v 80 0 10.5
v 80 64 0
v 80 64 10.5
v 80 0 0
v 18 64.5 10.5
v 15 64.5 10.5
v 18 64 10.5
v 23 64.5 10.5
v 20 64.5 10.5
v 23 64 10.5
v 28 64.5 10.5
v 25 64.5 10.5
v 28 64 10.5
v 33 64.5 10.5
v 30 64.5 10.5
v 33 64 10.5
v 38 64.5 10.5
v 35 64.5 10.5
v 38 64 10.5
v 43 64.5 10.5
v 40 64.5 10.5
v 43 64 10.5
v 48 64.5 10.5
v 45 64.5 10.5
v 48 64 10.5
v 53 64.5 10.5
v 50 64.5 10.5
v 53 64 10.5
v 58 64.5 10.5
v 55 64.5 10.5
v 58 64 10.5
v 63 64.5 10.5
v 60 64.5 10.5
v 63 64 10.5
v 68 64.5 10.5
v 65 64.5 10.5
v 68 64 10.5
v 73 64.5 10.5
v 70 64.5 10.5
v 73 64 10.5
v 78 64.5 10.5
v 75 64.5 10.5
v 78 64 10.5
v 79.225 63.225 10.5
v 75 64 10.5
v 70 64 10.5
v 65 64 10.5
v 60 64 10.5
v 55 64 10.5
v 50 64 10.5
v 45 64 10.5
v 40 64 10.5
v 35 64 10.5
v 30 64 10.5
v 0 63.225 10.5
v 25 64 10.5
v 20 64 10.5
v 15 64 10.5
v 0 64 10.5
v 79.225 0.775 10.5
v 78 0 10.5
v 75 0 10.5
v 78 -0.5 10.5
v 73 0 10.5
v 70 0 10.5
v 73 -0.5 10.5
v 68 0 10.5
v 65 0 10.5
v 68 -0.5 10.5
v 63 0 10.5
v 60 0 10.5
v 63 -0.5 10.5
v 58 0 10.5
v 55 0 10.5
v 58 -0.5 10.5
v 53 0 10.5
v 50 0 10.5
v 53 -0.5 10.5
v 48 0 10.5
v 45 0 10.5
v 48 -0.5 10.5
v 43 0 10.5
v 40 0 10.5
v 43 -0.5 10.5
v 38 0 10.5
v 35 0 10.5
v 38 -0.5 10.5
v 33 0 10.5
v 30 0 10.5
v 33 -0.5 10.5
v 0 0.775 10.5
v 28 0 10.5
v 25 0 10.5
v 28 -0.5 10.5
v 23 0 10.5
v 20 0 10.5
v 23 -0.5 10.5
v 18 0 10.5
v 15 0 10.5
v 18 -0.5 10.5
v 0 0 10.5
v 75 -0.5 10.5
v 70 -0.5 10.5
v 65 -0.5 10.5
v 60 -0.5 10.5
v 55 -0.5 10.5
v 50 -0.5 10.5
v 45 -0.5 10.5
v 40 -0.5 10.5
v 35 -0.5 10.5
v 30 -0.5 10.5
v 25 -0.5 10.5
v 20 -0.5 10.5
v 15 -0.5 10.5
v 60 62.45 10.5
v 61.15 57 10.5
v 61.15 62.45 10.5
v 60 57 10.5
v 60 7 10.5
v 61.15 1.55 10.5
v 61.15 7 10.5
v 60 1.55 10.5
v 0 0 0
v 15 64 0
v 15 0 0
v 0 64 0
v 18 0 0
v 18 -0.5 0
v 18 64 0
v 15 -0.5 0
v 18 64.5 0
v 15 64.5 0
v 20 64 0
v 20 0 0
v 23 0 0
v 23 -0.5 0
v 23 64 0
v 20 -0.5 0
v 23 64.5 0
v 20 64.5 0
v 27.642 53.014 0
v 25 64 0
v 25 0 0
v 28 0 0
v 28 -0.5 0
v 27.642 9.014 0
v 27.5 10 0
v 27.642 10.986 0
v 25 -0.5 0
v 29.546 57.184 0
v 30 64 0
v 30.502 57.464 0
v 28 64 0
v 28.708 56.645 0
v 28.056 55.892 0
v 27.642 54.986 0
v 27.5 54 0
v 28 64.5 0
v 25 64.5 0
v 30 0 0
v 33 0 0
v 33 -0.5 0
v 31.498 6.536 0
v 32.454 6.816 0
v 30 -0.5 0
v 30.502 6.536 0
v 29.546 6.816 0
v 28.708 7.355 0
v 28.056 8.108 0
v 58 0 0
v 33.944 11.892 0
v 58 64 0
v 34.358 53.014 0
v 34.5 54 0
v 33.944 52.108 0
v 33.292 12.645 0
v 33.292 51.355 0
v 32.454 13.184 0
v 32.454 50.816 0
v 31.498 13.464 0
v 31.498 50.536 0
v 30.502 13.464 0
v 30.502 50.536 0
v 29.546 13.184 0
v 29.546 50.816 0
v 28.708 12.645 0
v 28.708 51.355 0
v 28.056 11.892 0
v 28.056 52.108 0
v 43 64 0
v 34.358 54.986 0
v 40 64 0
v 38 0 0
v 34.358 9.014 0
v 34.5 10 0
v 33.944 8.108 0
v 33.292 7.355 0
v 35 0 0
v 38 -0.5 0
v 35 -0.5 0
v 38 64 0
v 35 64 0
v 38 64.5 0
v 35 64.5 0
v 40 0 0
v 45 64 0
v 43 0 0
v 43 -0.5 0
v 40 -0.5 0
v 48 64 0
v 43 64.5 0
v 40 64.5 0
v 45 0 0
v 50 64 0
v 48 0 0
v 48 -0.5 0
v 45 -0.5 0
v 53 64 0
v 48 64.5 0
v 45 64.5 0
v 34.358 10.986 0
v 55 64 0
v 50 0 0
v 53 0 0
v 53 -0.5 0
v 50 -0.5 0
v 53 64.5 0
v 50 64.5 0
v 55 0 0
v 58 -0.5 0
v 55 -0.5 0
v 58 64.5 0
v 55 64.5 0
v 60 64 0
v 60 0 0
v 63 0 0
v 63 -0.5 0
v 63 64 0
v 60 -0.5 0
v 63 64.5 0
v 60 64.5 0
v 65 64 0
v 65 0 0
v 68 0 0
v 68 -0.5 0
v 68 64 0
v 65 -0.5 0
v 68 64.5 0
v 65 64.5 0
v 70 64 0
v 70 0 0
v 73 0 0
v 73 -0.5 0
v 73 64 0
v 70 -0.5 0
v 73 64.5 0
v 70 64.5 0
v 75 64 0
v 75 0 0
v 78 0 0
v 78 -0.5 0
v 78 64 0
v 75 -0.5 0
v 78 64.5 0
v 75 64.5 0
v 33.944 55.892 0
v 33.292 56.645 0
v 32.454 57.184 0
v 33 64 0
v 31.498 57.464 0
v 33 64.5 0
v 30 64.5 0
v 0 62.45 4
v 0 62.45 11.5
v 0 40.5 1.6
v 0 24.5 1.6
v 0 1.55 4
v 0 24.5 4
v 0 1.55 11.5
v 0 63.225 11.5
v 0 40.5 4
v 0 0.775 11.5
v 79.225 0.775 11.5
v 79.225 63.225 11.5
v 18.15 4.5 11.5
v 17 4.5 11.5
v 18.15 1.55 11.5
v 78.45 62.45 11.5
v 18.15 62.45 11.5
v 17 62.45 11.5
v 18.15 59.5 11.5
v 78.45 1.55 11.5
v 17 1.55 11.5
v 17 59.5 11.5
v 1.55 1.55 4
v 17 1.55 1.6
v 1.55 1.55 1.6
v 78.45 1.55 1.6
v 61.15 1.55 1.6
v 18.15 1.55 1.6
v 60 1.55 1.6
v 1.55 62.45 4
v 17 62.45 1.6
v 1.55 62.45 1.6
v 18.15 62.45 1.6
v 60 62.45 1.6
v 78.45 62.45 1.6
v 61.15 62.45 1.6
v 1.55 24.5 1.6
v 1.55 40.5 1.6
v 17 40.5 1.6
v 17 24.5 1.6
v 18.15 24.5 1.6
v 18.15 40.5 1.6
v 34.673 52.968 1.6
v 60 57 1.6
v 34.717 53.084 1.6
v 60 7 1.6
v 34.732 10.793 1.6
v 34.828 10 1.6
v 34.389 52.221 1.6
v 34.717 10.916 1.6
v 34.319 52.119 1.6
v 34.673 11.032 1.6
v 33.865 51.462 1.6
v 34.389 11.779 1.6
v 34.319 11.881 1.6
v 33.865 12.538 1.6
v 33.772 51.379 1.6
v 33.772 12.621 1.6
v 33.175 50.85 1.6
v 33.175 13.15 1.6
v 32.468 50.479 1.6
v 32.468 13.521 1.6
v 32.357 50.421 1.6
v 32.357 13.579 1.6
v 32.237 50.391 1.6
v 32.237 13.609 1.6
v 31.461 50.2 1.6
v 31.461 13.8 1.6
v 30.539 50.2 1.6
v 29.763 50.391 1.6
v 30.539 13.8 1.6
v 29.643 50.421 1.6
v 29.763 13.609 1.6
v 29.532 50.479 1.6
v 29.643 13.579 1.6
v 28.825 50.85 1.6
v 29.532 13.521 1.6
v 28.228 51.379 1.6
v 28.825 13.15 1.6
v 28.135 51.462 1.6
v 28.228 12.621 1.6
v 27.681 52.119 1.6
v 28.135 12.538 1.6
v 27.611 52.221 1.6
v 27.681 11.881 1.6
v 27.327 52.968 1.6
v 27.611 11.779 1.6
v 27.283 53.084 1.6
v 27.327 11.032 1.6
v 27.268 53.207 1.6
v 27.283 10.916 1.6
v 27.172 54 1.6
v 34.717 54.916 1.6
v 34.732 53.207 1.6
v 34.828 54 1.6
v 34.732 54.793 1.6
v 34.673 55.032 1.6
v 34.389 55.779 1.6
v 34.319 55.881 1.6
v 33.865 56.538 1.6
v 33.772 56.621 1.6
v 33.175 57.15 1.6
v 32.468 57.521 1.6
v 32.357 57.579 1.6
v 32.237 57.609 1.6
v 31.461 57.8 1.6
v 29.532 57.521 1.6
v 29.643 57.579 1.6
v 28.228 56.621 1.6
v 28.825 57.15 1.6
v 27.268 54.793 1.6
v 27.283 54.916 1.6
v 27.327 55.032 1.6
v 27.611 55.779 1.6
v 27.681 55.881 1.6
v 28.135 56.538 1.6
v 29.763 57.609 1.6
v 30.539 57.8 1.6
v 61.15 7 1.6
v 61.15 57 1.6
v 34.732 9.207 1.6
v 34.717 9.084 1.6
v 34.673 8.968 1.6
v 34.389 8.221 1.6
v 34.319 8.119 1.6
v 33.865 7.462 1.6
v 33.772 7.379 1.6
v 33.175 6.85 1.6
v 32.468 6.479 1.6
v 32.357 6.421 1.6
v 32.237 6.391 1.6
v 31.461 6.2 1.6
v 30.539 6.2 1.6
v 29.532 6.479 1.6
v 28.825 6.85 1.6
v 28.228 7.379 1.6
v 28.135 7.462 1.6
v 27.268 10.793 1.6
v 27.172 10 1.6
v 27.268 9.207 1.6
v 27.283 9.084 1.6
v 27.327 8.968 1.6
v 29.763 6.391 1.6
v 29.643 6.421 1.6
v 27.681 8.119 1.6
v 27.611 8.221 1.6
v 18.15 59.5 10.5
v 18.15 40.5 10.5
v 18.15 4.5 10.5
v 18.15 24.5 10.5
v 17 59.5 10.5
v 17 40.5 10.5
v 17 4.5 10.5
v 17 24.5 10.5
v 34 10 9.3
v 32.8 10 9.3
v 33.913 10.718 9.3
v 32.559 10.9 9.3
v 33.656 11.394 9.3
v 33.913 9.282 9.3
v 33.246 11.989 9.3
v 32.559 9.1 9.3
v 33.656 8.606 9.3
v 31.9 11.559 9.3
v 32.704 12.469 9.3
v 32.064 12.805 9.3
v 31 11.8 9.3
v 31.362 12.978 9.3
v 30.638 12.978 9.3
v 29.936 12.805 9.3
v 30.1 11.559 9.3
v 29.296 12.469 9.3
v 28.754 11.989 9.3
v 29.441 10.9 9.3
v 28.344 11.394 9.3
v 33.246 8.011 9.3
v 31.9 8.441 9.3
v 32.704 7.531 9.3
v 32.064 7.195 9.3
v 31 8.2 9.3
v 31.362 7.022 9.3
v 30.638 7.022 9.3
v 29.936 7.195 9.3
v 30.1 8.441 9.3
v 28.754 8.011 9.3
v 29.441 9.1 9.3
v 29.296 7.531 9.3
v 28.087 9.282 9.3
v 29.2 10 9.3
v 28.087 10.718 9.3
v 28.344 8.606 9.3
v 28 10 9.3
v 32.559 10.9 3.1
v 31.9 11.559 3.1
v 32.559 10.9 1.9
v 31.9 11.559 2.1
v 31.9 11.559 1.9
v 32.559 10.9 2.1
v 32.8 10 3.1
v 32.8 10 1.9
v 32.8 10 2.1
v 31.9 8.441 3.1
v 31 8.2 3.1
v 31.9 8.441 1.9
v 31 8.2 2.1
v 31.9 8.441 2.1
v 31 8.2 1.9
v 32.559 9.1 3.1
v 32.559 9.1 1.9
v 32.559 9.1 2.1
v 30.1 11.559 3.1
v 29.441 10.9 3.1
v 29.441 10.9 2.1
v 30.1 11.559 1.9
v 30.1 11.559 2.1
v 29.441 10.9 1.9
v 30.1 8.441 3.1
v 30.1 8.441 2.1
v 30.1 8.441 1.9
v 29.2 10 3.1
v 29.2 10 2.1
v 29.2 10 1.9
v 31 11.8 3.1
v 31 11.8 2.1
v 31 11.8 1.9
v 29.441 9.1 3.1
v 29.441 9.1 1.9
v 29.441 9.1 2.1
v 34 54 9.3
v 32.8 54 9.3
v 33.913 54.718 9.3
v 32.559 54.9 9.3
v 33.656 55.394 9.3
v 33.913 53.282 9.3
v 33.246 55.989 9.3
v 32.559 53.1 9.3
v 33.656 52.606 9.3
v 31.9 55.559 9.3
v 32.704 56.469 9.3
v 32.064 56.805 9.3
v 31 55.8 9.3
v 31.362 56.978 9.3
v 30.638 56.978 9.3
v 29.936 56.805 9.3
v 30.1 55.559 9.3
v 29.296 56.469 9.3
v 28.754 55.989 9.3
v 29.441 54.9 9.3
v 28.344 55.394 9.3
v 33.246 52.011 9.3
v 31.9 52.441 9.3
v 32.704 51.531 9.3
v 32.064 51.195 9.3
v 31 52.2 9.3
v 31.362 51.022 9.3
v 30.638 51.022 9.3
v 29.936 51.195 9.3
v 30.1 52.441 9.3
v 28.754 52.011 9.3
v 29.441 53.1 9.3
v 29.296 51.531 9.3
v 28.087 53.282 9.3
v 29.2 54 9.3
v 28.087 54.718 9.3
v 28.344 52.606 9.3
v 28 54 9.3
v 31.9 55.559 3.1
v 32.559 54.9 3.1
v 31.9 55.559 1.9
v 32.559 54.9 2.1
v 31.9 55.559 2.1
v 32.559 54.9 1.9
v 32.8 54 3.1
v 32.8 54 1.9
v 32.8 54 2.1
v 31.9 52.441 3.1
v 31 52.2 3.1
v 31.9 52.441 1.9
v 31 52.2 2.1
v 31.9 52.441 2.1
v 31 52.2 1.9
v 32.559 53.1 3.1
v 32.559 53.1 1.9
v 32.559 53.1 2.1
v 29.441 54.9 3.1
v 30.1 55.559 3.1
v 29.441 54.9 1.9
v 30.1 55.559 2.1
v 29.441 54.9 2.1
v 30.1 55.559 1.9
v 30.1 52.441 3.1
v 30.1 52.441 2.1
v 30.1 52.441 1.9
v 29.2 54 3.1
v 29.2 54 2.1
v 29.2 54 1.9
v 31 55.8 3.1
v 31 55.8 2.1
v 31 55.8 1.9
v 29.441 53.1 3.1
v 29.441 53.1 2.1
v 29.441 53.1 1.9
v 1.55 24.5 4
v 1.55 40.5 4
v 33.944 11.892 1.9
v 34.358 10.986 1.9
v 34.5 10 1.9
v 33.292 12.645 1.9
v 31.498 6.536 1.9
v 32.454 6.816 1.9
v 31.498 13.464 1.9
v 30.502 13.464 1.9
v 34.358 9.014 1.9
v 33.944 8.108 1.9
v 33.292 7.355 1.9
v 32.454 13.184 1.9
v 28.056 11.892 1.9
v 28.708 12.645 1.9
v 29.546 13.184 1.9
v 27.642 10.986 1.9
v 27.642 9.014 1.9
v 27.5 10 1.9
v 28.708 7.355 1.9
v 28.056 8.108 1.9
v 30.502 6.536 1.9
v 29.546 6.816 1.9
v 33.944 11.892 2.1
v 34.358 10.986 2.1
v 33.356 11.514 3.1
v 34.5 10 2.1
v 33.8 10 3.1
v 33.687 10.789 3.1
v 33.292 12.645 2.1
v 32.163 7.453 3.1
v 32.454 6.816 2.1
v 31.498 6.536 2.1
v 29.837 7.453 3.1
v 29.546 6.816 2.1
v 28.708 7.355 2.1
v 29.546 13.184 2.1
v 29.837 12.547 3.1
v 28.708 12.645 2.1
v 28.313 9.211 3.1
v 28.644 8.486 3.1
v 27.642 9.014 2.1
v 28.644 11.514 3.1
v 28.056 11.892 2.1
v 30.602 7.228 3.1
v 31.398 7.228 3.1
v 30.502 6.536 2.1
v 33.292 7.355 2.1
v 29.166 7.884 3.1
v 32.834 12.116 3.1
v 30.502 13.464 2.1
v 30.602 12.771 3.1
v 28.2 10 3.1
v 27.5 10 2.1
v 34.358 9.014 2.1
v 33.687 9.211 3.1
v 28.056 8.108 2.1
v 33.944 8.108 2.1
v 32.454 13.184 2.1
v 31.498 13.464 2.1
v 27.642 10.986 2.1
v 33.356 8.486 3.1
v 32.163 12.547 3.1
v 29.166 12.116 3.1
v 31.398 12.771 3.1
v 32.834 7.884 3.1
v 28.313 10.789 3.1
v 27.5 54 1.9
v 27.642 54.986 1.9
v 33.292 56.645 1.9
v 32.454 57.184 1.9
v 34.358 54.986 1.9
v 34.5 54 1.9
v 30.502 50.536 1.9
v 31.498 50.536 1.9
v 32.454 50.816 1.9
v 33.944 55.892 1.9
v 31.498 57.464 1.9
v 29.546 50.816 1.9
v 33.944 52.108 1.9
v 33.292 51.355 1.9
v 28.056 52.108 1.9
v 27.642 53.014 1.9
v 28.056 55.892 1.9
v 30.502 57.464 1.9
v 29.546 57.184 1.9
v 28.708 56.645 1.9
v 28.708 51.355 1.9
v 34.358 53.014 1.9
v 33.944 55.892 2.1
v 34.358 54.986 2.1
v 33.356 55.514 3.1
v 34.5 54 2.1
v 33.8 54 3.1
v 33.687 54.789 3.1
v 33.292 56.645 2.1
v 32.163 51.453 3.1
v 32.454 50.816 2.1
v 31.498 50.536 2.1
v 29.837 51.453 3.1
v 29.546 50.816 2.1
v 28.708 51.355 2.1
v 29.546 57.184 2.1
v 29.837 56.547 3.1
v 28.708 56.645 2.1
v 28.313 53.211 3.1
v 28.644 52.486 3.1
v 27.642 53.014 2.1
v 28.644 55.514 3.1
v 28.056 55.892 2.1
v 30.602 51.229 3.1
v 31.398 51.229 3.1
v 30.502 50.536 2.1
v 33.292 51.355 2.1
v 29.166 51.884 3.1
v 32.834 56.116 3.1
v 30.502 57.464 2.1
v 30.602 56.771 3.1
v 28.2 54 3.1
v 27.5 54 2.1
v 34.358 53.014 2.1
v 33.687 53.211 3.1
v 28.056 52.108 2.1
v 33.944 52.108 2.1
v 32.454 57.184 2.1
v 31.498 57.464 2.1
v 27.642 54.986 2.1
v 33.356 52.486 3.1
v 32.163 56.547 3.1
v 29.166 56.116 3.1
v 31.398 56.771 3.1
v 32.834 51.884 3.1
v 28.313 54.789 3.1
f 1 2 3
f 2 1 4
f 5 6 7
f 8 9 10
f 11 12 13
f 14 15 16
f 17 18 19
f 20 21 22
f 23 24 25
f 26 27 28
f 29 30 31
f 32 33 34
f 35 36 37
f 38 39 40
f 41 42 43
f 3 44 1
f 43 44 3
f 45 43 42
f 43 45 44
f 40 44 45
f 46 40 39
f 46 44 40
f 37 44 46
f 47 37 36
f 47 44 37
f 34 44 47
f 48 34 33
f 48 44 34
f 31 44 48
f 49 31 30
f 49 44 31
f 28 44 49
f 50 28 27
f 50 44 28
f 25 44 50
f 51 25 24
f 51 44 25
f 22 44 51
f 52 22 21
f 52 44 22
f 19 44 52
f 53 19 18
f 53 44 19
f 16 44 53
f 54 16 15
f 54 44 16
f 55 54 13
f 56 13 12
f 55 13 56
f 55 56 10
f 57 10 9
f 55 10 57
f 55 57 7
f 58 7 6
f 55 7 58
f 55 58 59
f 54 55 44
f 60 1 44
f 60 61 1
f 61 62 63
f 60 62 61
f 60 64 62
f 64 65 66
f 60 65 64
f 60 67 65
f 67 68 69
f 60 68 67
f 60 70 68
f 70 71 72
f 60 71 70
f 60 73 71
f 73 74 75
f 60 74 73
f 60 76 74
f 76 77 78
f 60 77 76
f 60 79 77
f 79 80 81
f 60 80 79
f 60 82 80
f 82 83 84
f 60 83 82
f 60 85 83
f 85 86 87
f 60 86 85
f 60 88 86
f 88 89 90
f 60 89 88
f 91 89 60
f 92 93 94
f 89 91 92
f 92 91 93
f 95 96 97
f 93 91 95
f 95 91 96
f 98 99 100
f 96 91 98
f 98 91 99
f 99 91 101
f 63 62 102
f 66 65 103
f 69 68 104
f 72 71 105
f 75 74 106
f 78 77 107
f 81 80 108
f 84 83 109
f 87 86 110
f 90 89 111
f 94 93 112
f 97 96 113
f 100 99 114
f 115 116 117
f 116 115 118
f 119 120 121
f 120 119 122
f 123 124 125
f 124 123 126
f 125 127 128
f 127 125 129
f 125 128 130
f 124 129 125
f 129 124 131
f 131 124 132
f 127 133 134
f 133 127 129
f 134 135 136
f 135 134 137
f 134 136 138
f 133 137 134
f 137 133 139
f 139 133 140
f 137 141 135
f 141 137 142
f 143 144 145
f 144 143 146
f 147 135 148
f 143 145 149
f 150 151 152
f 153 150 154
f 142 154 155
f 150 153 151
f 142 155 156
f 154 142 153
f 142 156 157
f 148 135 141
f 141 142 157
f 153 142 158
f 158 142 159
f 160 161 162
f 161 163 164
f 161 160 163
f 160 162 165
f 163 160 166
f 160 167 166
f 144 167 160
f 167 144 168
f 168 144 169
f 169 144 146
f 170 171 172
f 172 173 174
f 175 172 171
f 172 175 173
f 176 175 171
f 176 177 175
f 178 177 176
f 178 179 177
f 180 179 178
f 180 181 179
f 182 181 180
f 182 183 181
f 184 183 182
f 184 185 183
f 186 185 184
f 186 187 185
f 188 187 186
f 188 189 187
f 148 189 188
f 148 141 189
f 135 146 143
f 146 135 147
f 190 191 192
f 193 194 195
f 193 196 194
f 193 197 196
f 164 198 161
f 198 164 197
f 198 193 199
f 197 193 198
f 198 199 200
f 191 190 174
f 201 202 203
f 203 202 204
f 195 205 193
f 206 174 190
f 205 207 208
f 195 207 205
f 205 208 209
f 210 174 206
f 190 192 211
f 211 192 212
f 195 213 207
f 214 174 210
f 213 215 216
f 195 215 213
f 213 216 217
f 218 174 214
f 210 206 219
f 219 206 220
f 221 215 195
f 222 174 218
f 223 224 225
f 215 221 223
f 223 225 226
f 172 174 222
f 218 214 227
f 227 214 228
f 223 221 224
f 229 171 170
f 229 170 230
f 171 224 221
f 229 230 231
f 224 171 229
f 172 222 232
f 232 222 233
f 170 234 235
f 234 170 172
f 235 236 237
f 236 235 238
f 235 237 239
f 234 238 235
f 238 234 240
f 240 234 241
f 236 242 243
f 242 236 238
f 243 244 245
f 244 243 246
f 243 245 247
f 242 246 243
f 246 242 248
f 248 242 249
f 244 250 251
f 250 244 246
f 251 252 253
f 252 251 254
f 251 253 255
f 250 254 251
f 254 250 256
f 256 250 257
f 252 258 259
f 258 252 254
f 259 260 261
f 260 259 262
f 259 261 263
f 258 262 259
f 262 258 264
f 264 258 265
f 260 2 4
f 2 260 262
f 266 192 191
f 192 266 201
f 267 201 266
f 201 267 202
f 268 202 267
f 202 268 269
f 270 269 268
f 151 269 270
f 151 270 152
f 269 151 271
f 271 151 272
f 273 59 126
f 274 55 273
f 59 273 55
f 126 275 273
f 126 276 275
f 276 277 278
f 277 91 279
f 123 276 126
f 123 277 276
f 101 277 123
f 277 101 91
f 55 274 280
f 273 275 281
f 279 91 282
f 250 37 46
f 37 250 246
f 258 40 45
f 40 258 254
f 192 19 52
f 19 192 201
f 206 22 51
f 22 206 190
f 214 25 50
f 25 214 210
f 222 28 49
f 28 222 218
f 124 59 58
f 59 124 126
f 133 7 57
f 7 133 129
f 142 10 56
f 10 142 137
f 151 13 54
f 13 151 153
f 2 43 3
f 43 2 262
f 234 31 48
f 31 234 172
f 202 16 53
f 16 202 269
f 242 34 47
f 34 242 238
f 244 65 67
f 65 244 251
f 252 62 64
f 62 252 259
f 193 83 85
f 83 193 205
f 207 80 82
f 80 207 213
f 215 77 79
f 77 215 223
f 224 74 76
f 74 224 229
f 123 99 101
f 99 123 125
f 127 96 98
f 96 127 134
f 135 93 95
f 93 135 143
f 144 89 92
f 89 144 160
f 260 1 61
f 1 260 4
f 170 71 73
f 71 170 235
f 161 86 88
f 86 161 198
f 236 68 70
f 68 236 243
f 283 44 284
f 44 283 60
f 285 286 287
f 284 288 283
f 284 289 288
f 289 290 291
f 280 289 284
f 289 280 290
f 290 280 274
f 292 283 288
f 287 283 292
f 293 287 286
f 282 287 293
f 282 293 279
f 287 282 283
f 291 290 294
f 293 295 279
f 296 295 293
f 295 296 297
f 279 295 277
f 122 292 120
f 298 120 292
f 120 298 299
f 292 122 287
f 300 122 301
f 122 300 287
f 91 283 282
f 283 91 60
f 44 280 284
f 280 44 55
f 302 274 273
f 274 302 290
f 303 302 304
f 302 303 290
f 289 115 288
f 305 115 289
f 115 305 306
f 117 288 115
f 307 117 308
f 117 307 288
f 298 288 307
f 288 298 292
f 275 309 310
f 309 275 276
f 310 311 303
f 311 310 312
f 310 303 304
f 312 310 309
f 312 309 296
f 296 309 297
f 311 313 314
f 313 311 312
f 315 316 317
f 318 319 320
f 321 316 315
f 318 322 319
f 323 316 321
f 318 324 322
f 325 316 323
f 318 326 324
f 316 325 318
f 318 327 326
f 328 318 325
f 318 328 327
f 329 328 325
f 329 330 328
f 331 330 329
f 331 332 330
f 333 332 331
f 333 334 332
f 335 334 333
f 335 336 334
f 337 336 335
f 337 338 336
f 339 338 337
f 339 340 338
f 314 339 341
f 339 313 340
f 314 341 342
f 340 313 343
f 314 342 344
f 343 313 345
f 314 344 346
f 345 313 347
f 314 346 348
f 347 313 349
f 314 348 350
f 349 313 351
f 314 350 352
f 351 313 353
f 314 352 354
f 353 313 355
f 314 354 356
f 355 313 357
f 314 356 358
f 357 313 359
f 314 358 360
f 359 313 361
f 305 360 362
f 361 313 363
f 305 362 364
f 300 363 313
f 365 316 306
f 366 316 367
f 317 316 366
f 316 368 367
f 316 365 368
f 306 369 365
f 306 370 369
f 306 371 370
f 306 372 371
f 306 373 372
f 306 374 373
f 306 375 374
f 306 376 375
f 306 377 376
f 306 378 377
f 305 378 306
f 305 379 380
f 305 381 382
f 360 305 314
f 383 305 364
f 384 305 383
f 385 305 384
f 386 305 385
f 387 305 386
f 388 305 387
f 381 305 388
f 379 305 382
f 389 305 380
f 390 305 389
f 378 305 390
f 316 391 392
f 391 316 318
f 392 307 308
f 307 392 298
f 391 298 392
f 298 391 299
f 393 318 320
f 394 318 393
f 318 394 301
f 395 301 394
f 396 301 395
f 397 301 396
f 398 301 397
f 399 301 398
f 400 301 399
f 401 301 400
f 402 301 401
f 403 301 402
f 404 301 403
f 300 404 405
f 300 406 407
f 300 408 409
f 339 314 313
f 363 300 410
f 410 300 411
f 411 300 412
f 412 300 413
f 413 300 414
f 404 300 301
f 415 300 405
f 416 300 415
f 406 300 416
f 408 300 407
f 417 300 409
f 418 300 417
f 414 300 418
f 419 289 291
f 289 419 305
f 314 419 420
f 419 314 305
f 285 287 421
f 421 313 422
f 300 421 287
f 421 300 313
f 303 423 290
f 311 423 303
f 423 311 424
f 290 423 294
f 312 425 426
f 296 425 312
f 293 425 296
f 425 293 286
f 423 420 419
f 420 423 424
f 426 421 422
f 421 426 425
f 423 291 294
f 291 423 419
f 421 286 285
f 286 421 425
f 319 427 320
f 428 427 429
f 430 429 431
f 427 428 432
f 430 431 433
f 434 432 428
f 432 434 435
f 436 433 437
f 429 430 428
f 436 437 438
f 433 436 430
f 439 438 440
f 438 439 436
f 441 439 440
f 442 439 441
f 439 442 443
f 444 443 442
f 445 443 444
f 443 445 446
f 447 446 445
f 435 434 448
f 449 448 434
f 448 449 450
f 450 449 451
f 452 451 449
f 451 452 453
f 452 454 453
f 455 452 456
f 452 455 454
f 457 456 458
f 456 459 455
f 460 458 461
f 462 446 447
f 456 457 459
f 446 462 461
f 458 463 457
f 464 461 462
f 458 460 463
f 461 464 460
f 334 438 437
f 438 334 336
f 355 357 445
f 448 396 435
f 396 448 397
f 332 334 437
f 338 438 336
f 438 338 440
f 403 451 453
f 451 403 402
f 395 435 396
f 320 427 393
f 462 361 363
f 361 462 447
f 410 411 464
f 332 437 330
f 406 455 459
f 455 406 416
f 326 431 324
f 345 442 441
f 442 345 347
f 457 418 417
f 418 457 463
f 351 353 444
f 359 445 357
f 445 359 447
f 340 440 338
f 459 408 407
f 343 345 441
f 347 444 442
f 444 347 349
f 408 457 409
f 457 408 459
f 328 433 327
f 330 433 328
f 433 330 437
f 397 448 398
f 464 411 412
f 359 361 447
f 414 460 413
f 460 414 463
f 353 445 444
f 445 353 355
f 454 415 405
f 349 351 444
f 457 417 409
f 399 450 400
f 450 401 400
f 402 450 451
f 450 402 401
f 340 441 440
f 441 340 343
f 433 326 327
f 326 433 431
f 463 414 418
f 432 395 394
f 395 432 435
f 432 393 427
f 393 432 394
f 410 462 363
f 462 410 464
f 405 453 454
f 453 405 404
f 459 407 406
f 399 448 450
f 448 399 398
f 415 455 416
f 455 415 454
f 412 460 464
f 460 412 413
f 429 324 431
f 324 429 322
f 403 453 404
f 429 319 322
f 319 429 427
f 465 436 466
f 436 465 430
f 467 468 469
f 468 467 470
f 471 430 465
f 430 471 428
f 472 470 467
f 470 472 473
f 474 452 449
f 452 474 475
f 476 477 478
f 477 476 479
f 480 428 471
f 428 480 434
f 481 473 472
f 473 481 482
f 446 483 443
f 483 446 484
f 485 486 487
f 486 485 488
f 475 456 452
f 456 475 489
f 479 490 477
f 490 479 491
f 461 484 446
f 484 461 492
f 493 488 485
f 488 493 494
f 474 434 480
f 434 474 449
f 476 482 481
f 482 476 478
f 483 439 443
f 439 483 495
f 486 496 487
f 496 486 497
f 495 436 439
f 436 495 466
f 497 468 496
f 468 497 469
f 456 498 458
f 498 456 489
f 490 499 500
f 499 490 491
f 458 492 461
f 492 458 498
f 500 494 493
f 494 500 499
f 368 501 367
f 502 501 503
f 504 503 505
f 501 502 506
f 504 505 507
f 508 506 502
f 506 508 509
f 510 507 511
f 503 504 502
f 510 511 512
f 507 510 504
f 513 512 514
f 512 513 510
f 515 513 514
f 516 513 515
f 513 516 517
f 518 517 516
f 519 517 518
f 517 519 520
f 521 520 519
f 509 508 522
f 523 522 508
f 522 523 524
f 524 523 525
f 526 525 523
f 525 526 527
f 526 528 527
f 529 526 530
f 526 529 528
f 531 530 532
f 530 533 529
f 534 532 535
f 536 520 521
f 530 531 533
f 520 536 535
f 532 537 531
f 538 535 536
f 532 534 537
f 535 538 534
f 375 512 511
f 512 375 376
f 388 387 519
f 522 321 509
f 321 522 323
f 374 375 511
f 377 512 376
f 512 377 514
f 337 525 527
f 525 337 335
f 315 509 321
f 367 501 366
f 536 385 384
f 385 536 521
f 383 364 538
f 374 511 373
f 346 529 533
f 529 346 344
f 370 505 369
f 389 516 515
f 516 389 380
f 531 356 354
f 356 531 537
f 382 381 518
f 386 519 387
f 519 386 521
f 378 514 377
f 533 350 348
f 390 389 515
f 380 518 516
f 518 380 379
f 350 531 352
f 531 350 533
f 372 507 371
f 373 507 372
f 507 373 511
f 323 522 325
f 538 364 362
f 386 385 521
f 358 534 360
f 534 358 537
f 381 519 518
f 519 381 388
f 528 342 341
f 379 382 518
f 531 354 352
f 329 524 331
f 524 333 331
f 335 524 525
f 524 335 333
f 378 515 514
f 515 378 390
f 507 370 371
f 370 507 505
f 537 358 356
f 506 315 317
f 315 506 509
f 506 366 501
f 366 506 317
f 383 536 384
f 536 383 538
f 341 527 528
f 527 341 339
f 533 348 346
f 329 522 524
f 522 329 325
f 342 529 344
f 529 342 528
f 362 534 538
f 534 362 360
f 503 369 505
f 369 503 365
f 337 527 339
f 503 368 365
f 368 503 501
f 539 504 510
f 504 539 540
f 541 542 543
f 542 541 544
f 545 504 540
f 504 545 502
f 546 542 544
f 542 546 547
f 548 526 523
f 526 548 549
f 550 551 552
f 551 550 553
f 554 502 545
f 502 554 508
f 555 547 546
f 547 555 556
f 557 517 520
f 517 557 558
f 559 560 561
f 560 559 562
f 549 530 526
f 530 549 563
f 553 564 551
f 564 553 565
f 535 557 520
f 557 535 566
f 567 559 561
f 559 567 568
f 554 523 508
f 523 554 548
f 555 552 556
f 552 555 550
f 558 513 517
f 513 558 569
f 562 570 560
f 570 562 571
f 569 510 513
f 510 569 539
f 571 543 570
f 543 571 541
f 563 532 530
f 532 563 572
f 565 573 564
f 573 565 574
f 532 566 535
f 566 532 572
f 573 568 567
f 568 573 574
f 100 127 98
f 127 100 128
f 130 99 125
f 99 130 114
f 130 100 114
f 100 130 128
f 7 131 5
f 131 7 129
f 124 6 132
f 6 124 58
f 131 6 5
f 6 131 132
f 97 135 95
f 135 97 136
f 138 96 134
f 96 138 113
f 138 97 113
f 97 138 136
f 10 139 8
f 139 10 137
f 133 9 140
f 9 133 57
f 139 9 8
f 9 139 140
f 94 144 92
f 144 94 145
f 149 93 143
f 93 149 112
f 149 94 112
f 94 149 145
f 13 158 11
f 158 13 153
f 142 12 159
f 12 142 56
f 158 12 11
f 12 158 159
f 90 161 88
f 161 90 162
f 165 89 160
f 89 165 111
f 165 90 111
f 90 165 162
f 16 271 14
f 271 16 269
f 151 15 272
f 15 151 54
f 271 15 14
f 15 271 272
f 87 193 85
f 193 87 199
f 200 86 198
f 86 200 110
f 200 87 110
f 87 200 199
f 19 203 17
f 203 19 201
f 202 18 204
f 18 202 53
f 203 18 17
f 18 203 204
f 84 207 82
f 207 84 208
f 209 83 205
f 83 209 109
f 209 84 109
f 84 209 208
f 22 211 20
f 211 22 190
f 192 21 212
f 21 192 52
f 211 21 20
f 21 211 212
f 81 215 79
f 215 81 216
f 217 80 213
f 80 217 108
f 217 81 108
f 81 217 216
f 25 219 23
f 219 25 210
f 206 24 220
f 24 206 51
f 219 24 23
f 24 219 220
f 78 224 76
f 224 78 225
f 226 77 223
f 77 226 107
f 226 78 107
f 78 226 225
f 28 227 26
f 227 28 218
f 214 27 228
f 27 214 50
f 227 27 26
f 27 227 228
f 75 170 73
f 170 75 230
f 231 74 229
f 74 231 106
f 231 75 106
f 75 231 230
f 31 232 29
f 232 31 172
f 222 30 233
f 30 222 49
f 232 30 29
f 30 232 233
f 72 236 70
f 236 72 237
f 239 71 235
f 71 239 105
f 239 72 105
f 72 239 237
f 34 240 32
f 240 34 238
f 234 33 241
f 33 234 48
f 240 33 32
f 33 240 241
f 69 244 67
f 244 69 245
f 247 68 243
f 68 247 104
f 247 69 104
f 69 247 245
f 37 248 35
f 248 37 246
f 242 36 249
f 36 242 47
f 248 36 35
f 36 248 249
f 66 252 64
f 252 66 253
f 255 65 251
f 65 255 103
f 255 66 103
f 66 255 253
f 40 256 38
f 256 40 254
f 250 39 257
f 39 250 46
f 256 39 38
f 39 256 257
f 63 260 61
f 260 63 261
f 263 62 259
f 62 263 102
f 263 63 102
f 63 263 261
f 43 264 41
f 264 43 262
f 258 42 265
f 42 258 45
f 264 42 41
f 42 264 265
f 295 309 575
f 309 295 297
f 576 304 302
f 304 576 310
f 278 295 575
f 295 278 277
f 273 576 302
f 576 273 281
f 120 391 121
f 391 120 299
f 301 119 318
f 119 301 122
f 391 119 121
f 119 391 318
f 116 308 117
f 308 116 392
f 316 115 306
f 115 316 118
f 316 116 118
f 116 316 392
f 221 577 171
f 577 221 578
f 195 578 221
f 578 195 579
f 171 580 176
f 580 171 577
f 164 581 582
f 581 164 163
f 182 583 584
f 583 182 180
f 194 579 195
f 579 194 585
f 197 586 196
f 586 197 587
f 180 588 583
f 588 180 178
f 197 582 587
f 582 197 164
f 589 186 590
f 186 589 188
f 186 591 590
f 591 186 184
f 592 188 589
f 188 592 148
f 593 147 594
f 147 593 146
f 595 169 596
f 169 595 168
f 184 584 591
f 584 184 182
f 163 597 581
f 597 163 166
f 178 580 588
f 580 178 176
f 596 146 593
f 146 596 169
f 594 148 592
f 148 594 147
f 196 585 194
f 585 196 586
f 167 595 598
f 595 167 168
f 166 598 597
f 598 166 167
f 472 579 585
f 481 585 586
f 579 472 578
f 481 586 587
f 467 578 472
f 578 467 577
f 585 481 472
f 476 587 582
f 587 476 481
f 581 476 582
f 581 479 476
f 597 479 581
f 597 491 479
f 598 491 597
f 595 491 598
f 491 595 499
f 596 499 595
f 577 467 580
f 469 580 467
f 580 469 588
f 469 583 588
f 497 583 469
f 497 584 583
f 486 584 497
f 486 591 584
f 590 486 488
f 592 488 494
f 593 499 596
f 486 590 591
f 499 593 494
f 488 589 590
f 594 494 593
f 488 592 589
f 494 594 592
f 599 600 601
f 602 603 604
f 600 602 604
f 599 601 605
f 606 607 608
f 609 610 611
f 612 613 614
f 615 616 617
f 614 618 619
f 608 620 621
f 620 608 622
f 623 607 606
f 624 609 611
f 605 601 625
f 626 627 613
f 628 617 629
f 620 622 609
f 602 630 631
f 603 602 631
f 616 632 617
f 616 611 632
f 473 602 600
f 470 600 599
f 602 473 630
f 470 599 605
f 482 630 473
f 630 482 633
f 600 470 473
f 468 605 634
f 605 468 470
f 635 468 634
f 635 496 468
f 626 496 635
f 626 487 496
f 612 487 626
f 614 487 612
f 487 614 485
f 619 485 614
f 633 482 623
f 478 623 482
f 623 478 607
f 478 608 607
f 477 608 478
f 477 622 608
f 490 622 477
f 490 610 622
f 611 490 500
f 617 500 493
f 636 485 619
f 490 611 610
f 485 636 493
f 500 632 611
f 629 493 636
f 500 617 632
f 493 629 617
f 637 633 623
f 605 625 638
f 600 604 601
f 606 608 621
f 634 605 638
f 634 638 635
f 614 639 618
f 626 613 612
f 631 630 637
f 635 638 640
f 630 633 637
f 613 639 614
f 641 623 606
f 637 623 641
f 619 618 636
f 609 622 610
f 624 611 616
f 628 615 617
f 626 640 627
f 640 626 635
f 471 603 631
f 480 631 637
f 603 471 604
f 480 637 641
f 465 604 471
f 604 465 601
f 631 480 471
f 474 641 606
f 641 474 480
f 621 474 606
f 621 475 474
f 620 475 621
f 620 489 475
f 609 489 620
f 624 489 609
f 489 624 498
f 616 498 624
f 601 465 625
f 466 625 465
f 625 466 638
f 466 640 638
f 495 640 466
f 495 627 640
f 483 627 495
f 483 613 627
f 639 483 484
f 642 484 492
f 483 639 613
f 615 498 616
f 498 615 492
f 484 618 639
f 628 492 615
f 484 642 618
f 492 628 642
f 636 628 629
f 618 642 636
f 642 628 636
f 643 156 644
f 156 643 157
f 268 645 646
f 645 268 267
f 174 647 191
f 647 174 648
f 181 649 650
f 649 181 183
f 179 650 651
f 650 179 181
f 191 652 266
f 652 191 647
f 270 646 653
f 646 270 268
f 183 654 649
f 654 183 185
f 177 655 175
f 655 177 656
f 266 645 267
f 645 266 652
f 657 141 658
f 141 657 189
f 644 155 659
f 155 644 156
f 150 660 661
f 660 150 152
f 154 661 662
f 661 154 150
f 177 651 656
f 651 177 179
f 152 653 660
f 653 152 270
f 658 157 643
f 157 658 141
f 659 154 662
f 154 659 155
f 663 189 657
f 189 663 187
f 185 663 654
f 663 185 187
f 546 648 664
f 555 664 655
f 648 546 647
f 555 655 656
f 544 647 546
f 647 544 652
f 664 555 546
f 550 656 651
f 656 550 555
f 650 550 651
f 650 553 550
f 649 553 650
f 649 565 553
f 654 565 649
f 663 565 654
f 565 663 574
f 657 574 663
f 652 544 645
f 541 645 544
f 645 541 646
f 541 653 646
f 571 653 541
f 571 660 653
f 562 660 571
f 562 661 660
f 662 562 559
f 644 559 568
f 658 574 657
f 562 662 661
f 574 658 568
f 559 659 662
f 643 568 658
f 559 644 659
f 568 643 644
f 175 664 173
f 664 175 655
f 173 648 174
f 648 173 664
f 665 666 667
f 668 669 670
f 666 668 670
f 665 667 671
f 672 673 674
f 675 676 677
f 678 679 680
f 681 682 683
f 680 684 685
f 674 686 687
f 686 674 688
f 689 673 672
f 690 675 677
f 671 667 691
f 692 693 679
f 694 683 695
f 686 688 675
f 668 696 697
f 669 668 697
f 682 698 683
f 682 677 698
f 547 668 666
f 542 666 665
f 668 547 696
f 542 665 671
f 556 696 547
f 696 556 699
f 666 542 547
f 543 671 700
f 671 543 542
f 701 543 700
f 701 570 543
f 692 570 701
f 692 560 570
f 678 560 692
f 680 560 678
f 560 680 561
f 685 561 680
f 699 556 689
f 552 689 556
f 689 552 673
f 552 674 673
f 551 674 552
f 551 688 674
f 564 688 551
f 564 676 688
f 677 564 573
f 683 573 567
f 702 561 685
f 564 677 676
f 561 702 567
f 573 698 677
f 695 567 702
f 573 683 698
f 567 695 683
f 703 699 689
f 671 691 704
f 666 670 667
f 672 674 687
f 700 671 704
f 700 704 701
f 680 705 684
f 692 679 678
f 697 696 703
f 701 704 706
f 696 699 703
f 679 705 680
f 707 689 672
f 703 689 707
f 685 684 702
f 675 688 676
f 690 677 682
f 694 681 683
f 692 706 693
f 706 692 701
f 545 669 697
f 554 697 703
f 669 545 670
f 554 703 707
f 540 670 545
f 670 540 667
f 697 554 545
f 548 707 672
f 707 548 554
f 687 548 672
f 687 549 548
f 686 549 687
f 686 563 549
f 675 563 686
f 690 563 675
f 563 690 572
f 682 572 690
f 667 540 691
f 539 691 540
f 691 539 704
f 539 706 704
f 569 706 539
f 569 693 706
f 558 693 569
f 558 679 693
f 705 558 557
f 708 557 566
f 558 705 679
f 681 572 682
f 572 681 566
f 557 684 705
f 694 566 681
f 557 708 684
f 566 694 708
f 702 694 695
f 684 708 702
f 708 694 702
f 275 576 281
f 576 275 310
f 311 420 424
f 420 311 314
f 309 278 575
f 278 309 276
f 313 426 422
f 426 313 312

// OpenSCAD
/* A8PicoCart shell
   (c) R.Edwards 2023
*/

ridge_width = 0.5;
cart_length=80;
cart_width=65 - (ridge_width*2);
cart_height=11.5;
screw_sep = 44;
front_thickness = 1.6;
sides_thickness = 1.6 - 0.05;
support_thickness = 1.2 - 0.05;
support_height = 10.5;
rim_height=1;
screw_head_h=2;

screw_head_height=2.9;
screw_head_radius=5.4/2;
screw_rod_radius=2.9/2;

module screwPlaceholder(height = 40) {
    // $fs=0.1;
    $fn=40;
    
    color("red",1.0)
    union() {
        cylinder(h = screw_head_height, r = screw_head_radius);
        cylinder(h = height, r = screw_rod_radius);
    }
}

module screwTower(support_height) {
    difference() {
        cylinder(h = support_height - 1.2, r1 = 4, r2 = 3,  $fs = 1);
        cylinder(h = support_height - 1.1, r1 = 1.8, r2 = 1.8,  $fs = 1);
    }
}

difference() {
    union() {
        difference() {
            // main shell
            union() {
                cube([cart_length, cart_width, cart_height-rim_height]);
                // rim
                translate([0, sides_thickness/2, cart_height-rim_height])
                    cube([cart_length-sides_thickness/2, sides_thickness/2, rim_height]);
                translate([0, cart_width-sides_thickness, cart_height-rim_height])
                    cube([cart_length-sides_thickness/2, sides_thickness/2, rim_height]);
                translate([cart_length-sides_thickness, sides_thickness/2, cart_height-rim_height])
                    cube([sides_thickness/2, cart_width-sides_thickness, rim_height]);
            }
            // make hollow
            translate([0, sides_thickness, front_thickness])
                cube([cart_length-sides_thickness,
                    cart_width-sides_thickness*2,
                    cart_height-front_thickness]);
        }    
        // end
        cube([sides_thickness, cart_width, 4]);
        // pcb supports
        difference() {
            translate([17, sides_thickness, 0])
                cube([support_thickness, cart_width-sides_thickness*2, cart_height]);
            translate([17, (cart_width-55)/2, support_height])
                cube([support_thickness, 55, cart_height-support_height]);
        }
        translate([60, 0, 0])
            cube([support_thickness, 7, support_height]);
        translate([60, cart_width-7, 0])
            cube([support_thickness, 7, support_height]);
        // screw holes
        translate([31, (cart_width-screw_sep)/2, 0])
            screwTower(support_height);
        translate([31, cart_width-(cart_width-screw_sep)/2, 0])
            screwTower(support_height);
        // ridges
        for (i = [15: 5: cart_length-5])
            union() {
                translate([i, -ridge_width, 0])
                    cube([3, ridge_width, cart_height-rim_height]);
                translate([i, cart_width, 0])
                    cube([3, ridge_width, cart_height-rim_height]);
            }
    }
    // screw head
    translate([31, (cart_width-screw_sep)/2, -0.1])
        cylinder(h = 2, r1 = 3.5, r2 = 3.5,  $fs = 1);
    translate([31, (cart_width-screw_sep)/2, screw_head_h + 0.1])
        cylinder(h = front_thickness-0.6, r1 = 3.5, r2 = 2.8,  $fs = 1);

    translate([31, cart_width-(cart_width-screw_sep)/2, -0.1])
        cylinder(h = 2, r1 = 3.5, r2 = 3.5,  $fs = 1);
    translate([31, cart_width-(cart_width-screw_sep)/2, screw_head_h + 0.1]) {
        cylinder(h = front_thickness-0.6, r1 = 3.5, r2 = 2.8,  $fs = 1);
    }
     // cutout USB slot
    translate([0, (cart_width-16)/2+0.5, front_thickness])    // pico is 0.5 mm off center
        cube([40, 16, cart_height]);
}
